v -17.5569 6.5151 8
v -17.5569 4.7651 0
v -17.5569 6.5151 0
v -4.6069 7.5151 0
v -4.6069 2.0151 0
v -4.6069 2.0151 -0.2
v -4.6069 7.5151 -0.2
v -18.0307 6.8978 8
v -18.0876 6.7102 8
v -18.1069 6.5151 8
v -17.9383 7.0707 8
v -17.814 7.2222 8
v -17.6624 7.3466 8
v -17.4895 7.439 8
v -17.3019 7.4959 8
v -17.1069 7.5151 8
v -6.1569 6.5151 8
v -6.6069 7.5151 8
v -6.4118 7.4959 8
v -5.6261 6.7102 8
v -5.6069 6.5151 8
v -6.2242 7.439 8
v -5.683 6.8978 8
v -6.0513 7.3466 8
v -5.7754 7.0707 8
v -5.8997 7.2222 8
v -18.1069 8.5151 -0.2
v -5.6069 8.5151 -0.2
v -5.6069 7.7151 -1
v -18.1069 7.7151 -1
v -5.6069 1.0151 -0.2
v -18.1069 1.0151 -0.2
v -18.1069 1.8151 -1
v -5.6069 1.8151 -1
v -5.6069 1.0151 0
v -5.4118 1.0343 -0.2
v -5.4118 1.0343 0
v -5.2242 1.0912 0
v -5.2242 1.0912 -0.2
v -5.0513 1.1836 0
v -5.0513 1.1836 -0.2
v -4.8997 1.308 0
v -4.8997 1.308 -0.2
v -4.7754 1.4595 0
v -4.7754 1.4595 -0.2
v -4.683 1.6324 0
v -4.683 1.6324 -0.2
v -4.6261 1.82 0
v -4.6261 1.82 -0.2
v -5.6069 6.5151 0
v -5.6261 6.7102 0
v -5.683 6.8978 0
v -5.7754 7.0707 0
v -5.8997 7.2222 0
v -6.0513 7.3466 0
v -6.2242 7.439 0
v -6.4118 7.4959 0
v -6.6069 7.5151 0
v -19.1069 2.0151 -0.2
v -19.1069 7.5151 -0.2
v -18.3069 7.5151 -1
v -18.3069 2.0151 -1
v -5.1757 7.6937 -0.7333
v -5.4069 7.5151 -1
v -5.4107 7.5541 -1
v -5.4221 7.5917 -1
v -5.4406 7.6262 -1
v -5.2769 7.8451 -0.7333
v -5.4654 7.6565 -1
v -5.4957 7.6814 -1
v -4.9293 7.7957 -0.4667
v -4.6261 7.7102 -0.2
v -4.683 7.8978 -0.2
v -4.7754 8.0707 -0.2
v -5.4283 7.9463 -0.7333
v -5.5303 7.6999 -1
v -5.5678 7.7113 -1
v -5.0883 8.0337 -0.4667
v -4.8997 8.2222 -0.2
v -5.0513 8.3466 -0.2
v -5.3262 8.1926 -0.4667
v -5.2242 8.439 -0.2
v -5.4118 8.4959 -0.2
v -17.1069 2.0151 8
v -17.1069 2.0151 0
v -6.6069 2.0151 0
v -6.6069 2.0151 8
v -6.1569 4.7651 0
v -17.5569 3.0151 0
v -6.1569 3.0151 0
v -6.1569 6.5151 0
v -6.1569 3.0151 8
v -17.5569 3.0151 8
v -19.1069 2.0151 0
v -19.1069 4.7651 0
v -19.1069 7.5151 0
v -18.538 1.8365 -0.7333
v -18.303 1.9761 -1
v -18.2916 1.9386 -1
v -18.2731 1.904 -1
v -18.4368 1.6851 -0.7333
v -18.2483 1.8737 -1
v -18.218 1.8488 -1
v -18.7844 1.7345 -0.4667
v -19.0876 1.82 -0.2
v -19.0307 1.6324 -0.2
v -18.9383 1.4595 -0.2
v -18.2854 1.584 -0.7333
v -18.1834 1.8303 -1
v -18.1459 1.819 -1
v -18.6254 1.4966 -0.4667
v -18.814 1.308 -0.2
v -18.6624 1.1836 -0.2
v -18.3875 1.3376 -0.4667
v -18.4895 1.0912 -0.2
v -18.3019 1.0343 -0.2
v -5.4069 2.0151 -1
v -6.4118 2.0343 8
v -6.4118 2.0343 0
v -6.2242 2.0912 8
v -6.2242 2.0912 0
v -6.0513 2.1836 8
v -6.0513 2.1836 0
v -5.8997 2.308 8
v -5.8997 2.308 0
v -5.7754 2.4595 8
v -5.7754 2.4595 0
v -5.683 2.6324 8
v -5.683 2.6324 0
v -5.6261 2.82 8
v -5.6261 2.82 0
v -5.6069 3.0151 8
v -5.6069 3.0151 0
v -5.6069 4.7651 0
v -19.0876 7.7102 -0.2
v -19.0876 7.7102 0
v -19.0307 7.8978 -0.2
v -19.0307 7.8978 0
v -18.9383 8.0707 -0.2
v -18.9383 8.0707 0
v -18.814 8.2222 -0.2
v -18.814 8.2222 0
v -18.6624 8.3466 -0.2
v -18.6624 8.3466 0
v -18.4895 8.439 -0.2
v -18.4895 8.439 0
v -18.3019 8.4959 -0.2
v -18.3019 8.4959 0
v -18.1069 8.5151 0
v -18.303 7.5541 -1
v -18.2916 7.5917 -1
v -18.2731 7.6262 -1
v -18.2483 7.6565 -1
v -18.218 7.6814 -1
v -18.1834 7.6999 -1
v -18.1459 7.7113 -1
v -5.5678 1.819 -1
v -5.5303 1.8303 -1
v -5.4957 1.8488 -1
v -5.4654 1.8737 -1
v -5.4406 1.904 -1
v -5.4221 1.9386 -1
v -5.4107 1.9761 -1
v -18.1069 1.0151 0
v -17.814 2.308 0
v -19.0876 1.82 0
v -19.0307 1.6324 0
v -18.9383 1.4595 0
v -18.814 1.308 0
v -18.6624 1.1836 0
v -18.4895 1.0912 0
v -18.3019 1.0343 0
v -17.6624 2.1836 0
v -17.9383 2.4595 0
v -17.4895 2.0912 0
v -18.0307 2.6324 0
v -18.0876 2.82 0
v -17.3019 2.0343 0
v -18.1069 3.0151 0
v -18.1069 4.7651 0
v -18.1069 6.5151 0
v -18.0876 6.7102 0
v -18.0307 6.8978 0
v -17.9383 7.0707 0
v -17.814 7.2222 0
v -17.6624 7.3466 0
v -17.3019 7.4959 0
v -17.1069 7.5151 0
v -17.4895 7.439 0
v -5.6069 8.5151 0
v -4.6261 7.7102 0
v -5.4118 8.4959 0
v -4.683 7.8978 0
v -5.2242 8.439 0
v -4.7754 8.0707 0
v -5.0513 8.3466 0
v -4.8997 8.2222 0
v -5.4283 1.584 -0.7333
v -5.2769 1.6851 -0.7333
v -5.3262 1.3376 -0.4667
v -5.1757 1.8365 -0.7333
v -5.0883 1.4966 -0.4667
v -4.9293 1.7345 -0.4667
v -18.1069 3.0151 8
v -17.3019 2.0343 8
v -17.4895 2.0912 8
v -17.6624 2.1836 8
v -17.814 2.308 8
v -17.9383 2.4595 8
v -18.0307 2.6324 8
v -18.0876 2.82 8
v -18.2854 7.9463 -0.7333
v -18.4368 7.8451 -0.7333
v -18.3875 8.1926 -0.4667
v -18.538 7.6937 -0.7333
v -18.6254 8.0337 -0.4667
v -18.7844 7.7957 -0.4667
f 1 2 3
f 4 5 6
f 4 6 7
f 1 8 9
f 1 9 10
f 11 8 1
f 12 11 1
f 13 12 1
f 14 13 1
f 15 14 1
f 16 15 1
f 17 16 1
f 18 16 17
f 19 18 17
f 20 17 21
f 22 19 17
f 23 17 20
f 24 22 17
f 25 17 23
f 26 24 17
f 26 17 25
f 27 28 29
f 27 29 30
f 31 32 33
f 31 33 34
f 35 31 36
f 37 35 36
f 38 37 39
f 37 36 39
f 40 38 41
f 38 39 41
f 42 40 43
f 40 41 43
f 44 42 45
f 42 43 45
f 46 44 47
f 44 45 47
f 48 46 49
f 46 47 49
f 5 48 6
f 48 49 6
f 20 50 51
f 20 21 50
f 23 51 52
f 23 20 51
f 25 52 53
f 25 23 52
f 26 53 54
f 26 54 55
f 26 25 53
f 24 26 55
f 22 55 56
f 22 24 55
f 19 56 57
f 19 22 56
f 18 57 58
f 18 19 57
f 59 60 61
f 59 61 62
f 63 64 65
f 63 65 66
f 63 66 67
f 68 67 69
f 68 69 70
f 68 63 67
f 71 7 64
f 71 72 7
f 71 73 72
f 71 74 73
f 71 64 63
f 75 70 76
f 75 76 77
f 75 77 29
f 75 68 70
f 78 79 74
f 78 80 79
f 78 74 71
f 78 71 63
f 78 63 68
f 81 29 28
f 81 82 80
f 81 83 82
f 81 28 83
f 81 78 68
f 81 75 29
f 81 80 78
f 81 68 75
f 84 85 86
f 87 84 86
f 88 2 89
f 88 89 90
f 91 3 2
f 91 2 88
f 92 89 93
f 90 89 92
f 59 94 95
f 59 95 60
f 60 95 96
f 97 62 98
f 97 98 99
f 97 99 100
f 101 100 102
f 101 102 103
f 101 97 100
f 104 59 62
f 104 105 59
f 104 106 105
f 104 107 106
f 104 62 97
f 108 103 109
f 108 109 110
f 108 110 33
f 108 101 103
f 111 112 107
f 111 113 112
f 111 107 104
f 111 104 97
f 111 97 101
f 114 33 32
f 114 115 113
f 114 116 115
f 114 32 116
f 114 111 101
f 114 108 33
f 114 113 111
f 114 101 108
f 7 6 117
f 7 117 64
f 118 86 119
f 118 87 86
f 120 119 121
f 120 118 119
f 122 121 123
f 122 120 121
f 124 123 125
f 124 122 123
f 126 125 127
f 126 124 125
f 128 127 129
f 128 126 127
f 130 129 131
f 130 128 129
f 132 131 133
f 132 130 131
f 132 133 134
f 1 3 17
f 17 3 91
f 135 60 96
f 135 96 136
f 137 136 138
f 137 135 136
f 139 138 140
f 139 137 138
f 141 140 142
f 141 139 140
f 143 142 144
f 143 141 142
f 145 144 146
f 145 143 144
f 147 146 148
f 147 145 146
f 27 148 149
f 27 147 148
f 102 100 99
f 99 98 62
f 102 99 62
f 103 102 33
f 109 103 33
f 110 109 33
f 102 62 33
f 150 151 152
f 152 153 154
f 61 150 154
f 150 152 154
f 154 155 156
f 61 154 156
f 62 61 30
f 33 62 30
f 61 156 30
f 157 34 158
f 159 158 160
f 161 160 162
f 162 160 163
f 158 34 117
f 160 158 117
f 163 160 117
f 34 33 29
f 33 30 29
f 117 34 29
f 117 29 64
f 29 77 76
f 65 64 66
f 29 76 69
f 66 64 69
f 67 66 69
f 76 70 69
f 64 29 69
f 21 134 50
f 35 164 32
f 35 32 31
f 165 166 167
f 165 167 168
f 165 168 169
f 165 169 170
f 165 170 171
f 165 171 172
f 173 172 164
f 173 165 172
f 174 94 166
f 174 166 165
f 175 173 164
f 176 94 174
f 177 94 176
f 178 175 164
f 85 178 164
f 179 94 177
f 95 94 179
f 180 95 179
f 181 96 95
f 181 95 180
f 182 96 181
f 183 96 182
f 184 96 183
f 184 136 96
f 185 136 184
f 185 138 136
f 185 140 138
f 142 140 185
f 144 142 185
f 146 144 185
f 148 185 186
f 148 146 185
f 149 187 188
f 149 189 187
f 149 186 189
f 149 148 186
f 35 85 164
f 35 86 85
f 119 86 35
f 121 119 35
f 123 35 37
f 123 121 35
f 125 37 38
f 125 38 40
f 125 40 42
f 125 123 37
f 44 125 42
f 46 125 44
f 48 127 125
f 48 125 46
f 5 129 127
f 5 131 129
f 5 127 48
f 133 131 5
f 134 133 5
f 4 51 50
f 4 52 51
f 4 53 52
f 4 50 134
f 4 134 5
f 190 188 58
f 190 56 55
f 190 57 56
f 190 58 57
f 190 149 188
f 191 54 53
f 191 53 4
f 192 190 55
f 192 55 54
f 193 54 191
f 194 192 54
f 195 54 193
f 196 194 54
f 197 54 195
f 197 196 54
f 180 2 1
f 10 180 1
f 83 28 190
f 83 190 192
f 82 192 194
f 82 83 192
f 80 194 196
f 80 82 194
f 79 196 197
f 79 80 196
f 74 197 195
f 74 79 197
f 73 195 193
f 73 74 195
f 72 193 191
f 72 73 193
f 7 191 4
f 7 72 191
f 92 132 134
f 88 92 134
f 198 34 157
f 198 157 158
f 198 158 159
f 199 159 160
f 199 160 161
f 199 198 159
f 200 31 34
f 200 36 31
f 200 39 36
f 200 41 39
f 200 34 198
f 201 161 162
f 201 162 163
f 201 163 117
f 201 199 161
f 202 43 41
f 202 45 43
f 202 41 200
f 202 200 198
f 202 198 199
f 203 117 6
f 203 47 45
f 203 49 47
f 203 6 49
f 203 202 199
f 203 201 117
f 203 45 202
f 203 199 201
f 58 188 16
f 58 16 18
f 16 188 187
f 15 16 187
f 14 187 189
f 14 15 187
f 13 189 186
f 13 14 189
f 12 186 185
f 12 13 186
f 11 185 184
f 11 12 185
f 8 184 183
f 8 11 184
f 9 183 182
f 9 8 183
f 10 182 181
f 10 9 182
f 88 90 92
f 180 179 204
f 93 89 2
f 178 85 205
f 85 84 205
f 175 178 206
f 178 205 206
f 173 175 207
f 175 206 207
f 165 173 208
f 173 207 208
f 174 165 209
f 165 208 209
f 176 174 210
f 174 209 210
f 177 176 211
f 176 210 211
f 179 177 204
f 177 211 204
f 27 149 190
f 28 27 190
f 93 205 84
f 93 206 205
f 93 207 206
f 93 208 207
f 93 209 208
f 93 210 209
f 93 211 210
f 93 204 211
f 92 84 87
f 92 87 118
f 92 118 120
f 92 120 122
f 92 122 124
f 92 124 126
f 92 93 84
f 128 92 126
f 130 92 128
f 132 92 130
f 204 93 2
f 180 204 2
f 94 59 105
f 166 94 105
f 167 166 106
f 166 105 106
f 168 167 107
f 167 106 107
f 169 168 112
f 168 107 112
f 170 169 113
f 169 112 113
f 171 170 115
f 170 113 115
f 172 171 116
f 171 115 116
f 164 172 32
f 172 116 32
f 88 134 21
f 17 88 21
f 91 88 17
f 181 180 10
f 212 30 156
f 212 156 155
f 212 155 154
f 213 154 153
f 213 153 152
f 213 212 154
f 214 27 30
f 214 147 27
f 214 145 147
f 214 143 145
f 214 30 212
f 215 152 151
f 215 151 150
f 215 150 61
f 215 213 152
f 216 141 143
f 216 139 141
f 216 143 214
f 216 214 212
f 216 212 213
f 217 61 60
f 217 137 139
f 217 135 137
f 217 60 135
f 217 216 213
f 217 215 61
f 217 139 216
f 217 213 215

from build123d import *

# Parameters (mm, degrees)
F0_W     = 12.5
F0_H     = 5.5
F0_W_2   = 11.4
F0_H_2   = 3.5
F1_DEPTH = 8
F0_W_3   = 14.5
F0_H_3   = 7.5
F2_DEPTH = 1
F3_R     = 1
F5_DEPTH = 25
F6_SIZE  = 0.8


with BuildPart() as f1:
    # F0 (on Top) → F1 (new body)
    with BuildSketch(Plane.XY):
        with Locations((-11.856854585, 4.7651143782)):
            Rectangle(F0_W, F0_H)
        with Locations((-11.856854585, 4.7651143782)):
            Rectangle(F0_W_2, F0_H_2, mode=Mode.SUBTRACT)
    extrude(amount=F1_DEPTH)

    # F0 (on Top) → F2 (join)
    with BuildSketch(Plane.XY):
        with Locations((-11.856854585, 4.7651143782)):
            Rectangle(F0_W_3, F0_H_3)
        with Locations((-11.856854585, 4.7651143782)):
            Rectangle(F0_W, F0_H, mode=Mode.SUBTRACT)
        with Locations((-11.856854585, 4.7651143782)):
            Rectangle(F0_W, F0_H)
        with Locations((-11.856854585, 4.7651143782)):
            Rectangle(F0_W_2, F0_H_2, mode=Mode.SUBTRACT)
        with Locations((-11.856854585, 4.7651143782)):
            Rectangle(F0_W_2, F0_H_2)
    extrude(amount=-F2_DEPTH)

    # F3
    f3_edges = [f1.edges().sort_by_distance(p)[0] for p in [
        (-18.106855, 2.015114, 4),
        (-5.606855, 2.015114, 4),
        (-18.106855, 7.515114, 4),
        (-5.606855, 7.515114, 4),
        (-19.106855, 1.015114, -0.5),
        (-4.606855, 1.015114, -0.5),
        (-19.106855, 8.515114, -0.5),
        (-4.606855, 8.515114, -0.5),
    ]]
    fillet(f3_edges, radius=F3_R)

    # F4 (on face) → F5 (cut)
    with BuildSketch(Plane.YZ.offset(-5.606854585)):
        Polygon((6.5151143782, 8), (3.0151143782, 8), (4.7651143782, 0), align=None)
    extrude(amount=-F5_DEPTH, mode=Mode.SUBTRACT)

    # F6
    f6_edges = [f1.edges().sort_by_distance(p)[0] for p in [
        (-11.856855, 1.015114, -1),
        (-18.813961, 1.308008, -1),
        (-4.899748, 1.308008, -1),
        (-4.606855, 4.765114, -1),
        (-4.899748, 8.222221, -1),
        (-11.856855, 8.515114, -1),
        (-19.106855, 4.765114, -1),
        (-18.813961, 8.222221, -1),
    ]]
    chamfer(f6_edges, length=F6_SIZE)


solid = f1.part
